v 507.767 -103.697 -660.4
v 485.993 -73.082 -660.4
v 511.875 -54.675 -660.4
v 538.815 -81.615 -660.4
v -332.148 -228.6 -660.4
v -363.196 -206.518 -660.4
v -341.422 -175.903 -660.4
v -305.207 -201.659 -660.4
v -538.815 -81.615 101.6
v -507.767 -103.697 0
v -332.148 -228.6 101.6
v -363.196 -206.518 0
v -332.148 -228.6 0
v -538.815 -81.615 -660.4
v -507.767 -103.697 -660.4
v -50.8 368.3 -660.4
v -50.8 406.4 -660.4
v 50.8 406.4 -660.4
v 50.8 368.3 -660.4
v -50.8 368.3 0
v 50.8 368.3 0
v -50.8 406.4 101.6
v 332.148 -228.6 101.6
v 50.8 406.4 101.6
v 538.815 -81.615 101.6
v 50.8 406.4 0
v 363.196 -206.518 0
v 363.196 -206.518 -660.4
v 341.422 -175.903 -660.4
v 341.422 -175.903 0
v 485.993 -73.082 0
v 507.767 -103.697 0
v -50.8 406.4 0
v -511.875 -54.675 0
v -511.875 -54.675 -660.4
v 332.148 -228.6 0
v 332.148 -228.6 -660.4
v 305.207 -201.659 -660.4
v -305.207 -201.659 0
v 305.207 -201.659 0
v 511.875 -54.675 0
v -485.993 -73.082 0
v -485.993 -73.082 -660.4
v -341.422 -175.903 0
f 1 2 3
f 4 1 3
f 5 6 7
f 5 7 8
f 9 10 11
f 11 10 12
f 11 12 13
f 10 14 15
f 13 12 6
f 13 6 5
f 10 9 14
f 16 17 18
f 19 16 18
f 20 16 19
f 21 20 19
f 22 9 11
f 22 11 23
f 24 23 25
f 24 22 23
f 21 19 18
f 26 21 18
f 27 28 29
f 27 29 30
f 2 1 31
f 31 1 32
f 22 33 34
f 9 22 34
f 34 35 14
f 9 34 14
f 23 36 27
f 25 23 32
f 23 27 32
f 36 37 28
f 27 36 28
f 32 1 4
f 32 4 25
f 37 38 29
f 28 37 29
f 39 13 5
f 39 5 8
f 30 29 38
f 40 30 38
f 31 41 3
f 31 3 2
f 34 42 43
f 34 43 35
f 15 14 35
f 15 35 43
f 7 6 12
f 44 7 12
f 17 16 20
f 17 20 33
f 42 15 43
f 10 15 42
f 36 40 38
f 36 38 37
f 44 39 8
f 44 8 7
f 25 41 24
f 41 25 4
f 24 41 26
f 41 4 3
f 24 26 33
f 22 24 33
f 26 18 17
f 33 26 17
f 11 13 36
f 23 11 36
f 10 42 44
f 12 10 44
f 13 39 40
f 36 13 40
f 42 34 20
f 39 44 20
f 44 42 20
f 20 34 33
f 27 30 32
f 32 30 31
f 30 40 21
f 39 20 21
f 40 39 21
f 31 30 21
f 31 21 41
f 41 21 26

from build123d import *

# Parameters (mm, degrees)
F1_DEPTH = 101.6
F2_W     = 101.6
F2_H     = 38.1
F3_DEPTH = 762
F4_W     = 177.4056817709
F4_H     = 660.4
F5_DEPTH = 76.2


# Not quite as in the source:
# - a pattern or mirror of a feature is missing from the dataset's text; its kind, count and spacing are read off the source's solid


with BuildPart() as f1:
    # F0 (on Top) → F1 (new body)
    with BuildSketch(Plane.XY):
        Polygon((332.1480994978, 125.0519005022), (228.6, 228.6), (0, 228.6), (-228.6, 228.6), (-332.1480994978, 125.0519005022), (-332.1480994978, -228.6), (-228.6, -228.6), (228.6, -228.6), (332.1480994978, -228.6), align=None)
        Polygon((-228.6, 228.6), (0, 228.6), (0, 406.4), (-50.8, 406.4), align=None)
        Polygon((0, 228.6), (228.6, 228.6), (50.8, 406.4), (0, 406.4), align=None)
        Polygon((538.8153672641, -81.6153672641), (332.1480994978, 125.0519005022), (332.1480994978, -228.6), align=None)
        Polygon((-332.1480994978, -228.6), (-332.1480994978, 125.0519005022), (-538.8153672641, -81.6153672641), align=None)
    extrude(amount=F1_DEPTH)

    # F2 (on face) → F3 (join)
    with BuildSketch(Plane.XY.offset(101.6)):
        Polygon((-511.8745989009, -54.6745989009), (-538.8153672641, -81.6153672641), (-332.1480994978, -228.6), (-305.2073311346, -201.6592316368), align=None)
        Polygon((305.2073311346, -201.6592316368), (332.1480994978, -228.6), (538.8153672641, -81.6153672641), (511.8745989009, -54.6745989009), align=None)
        with Locations((0, 387.35)):
            Rectangle(F2_W, F2_H)
    extrude(amount=-F3_DEPTH)

    # F4 (on face) → F5 (cut)
    with BuildSketch(Plane(origin=(219.5423321657, -308.6867865247, 0), x_dir=(0.8149157634, 0.5795794152, 0), z_dir=(0.5795794152, -0.8149157634, 0))):
        with Locations((264.983708636, -330.2)):
            Rectangle(F4_W, F4_H)
    f5 = extrude(amount=-F5_DEPTH, mode=Mode.SUBTRACT)

    # F5_copies: F5 across plane
    add(f5.mirror(Plane(origin=(0, 0, 0), x_dir=(0, 0, -1), z_dir=(-1, 0, 0))), mode=Mode.SUBTRACT)


solid = f1.part
